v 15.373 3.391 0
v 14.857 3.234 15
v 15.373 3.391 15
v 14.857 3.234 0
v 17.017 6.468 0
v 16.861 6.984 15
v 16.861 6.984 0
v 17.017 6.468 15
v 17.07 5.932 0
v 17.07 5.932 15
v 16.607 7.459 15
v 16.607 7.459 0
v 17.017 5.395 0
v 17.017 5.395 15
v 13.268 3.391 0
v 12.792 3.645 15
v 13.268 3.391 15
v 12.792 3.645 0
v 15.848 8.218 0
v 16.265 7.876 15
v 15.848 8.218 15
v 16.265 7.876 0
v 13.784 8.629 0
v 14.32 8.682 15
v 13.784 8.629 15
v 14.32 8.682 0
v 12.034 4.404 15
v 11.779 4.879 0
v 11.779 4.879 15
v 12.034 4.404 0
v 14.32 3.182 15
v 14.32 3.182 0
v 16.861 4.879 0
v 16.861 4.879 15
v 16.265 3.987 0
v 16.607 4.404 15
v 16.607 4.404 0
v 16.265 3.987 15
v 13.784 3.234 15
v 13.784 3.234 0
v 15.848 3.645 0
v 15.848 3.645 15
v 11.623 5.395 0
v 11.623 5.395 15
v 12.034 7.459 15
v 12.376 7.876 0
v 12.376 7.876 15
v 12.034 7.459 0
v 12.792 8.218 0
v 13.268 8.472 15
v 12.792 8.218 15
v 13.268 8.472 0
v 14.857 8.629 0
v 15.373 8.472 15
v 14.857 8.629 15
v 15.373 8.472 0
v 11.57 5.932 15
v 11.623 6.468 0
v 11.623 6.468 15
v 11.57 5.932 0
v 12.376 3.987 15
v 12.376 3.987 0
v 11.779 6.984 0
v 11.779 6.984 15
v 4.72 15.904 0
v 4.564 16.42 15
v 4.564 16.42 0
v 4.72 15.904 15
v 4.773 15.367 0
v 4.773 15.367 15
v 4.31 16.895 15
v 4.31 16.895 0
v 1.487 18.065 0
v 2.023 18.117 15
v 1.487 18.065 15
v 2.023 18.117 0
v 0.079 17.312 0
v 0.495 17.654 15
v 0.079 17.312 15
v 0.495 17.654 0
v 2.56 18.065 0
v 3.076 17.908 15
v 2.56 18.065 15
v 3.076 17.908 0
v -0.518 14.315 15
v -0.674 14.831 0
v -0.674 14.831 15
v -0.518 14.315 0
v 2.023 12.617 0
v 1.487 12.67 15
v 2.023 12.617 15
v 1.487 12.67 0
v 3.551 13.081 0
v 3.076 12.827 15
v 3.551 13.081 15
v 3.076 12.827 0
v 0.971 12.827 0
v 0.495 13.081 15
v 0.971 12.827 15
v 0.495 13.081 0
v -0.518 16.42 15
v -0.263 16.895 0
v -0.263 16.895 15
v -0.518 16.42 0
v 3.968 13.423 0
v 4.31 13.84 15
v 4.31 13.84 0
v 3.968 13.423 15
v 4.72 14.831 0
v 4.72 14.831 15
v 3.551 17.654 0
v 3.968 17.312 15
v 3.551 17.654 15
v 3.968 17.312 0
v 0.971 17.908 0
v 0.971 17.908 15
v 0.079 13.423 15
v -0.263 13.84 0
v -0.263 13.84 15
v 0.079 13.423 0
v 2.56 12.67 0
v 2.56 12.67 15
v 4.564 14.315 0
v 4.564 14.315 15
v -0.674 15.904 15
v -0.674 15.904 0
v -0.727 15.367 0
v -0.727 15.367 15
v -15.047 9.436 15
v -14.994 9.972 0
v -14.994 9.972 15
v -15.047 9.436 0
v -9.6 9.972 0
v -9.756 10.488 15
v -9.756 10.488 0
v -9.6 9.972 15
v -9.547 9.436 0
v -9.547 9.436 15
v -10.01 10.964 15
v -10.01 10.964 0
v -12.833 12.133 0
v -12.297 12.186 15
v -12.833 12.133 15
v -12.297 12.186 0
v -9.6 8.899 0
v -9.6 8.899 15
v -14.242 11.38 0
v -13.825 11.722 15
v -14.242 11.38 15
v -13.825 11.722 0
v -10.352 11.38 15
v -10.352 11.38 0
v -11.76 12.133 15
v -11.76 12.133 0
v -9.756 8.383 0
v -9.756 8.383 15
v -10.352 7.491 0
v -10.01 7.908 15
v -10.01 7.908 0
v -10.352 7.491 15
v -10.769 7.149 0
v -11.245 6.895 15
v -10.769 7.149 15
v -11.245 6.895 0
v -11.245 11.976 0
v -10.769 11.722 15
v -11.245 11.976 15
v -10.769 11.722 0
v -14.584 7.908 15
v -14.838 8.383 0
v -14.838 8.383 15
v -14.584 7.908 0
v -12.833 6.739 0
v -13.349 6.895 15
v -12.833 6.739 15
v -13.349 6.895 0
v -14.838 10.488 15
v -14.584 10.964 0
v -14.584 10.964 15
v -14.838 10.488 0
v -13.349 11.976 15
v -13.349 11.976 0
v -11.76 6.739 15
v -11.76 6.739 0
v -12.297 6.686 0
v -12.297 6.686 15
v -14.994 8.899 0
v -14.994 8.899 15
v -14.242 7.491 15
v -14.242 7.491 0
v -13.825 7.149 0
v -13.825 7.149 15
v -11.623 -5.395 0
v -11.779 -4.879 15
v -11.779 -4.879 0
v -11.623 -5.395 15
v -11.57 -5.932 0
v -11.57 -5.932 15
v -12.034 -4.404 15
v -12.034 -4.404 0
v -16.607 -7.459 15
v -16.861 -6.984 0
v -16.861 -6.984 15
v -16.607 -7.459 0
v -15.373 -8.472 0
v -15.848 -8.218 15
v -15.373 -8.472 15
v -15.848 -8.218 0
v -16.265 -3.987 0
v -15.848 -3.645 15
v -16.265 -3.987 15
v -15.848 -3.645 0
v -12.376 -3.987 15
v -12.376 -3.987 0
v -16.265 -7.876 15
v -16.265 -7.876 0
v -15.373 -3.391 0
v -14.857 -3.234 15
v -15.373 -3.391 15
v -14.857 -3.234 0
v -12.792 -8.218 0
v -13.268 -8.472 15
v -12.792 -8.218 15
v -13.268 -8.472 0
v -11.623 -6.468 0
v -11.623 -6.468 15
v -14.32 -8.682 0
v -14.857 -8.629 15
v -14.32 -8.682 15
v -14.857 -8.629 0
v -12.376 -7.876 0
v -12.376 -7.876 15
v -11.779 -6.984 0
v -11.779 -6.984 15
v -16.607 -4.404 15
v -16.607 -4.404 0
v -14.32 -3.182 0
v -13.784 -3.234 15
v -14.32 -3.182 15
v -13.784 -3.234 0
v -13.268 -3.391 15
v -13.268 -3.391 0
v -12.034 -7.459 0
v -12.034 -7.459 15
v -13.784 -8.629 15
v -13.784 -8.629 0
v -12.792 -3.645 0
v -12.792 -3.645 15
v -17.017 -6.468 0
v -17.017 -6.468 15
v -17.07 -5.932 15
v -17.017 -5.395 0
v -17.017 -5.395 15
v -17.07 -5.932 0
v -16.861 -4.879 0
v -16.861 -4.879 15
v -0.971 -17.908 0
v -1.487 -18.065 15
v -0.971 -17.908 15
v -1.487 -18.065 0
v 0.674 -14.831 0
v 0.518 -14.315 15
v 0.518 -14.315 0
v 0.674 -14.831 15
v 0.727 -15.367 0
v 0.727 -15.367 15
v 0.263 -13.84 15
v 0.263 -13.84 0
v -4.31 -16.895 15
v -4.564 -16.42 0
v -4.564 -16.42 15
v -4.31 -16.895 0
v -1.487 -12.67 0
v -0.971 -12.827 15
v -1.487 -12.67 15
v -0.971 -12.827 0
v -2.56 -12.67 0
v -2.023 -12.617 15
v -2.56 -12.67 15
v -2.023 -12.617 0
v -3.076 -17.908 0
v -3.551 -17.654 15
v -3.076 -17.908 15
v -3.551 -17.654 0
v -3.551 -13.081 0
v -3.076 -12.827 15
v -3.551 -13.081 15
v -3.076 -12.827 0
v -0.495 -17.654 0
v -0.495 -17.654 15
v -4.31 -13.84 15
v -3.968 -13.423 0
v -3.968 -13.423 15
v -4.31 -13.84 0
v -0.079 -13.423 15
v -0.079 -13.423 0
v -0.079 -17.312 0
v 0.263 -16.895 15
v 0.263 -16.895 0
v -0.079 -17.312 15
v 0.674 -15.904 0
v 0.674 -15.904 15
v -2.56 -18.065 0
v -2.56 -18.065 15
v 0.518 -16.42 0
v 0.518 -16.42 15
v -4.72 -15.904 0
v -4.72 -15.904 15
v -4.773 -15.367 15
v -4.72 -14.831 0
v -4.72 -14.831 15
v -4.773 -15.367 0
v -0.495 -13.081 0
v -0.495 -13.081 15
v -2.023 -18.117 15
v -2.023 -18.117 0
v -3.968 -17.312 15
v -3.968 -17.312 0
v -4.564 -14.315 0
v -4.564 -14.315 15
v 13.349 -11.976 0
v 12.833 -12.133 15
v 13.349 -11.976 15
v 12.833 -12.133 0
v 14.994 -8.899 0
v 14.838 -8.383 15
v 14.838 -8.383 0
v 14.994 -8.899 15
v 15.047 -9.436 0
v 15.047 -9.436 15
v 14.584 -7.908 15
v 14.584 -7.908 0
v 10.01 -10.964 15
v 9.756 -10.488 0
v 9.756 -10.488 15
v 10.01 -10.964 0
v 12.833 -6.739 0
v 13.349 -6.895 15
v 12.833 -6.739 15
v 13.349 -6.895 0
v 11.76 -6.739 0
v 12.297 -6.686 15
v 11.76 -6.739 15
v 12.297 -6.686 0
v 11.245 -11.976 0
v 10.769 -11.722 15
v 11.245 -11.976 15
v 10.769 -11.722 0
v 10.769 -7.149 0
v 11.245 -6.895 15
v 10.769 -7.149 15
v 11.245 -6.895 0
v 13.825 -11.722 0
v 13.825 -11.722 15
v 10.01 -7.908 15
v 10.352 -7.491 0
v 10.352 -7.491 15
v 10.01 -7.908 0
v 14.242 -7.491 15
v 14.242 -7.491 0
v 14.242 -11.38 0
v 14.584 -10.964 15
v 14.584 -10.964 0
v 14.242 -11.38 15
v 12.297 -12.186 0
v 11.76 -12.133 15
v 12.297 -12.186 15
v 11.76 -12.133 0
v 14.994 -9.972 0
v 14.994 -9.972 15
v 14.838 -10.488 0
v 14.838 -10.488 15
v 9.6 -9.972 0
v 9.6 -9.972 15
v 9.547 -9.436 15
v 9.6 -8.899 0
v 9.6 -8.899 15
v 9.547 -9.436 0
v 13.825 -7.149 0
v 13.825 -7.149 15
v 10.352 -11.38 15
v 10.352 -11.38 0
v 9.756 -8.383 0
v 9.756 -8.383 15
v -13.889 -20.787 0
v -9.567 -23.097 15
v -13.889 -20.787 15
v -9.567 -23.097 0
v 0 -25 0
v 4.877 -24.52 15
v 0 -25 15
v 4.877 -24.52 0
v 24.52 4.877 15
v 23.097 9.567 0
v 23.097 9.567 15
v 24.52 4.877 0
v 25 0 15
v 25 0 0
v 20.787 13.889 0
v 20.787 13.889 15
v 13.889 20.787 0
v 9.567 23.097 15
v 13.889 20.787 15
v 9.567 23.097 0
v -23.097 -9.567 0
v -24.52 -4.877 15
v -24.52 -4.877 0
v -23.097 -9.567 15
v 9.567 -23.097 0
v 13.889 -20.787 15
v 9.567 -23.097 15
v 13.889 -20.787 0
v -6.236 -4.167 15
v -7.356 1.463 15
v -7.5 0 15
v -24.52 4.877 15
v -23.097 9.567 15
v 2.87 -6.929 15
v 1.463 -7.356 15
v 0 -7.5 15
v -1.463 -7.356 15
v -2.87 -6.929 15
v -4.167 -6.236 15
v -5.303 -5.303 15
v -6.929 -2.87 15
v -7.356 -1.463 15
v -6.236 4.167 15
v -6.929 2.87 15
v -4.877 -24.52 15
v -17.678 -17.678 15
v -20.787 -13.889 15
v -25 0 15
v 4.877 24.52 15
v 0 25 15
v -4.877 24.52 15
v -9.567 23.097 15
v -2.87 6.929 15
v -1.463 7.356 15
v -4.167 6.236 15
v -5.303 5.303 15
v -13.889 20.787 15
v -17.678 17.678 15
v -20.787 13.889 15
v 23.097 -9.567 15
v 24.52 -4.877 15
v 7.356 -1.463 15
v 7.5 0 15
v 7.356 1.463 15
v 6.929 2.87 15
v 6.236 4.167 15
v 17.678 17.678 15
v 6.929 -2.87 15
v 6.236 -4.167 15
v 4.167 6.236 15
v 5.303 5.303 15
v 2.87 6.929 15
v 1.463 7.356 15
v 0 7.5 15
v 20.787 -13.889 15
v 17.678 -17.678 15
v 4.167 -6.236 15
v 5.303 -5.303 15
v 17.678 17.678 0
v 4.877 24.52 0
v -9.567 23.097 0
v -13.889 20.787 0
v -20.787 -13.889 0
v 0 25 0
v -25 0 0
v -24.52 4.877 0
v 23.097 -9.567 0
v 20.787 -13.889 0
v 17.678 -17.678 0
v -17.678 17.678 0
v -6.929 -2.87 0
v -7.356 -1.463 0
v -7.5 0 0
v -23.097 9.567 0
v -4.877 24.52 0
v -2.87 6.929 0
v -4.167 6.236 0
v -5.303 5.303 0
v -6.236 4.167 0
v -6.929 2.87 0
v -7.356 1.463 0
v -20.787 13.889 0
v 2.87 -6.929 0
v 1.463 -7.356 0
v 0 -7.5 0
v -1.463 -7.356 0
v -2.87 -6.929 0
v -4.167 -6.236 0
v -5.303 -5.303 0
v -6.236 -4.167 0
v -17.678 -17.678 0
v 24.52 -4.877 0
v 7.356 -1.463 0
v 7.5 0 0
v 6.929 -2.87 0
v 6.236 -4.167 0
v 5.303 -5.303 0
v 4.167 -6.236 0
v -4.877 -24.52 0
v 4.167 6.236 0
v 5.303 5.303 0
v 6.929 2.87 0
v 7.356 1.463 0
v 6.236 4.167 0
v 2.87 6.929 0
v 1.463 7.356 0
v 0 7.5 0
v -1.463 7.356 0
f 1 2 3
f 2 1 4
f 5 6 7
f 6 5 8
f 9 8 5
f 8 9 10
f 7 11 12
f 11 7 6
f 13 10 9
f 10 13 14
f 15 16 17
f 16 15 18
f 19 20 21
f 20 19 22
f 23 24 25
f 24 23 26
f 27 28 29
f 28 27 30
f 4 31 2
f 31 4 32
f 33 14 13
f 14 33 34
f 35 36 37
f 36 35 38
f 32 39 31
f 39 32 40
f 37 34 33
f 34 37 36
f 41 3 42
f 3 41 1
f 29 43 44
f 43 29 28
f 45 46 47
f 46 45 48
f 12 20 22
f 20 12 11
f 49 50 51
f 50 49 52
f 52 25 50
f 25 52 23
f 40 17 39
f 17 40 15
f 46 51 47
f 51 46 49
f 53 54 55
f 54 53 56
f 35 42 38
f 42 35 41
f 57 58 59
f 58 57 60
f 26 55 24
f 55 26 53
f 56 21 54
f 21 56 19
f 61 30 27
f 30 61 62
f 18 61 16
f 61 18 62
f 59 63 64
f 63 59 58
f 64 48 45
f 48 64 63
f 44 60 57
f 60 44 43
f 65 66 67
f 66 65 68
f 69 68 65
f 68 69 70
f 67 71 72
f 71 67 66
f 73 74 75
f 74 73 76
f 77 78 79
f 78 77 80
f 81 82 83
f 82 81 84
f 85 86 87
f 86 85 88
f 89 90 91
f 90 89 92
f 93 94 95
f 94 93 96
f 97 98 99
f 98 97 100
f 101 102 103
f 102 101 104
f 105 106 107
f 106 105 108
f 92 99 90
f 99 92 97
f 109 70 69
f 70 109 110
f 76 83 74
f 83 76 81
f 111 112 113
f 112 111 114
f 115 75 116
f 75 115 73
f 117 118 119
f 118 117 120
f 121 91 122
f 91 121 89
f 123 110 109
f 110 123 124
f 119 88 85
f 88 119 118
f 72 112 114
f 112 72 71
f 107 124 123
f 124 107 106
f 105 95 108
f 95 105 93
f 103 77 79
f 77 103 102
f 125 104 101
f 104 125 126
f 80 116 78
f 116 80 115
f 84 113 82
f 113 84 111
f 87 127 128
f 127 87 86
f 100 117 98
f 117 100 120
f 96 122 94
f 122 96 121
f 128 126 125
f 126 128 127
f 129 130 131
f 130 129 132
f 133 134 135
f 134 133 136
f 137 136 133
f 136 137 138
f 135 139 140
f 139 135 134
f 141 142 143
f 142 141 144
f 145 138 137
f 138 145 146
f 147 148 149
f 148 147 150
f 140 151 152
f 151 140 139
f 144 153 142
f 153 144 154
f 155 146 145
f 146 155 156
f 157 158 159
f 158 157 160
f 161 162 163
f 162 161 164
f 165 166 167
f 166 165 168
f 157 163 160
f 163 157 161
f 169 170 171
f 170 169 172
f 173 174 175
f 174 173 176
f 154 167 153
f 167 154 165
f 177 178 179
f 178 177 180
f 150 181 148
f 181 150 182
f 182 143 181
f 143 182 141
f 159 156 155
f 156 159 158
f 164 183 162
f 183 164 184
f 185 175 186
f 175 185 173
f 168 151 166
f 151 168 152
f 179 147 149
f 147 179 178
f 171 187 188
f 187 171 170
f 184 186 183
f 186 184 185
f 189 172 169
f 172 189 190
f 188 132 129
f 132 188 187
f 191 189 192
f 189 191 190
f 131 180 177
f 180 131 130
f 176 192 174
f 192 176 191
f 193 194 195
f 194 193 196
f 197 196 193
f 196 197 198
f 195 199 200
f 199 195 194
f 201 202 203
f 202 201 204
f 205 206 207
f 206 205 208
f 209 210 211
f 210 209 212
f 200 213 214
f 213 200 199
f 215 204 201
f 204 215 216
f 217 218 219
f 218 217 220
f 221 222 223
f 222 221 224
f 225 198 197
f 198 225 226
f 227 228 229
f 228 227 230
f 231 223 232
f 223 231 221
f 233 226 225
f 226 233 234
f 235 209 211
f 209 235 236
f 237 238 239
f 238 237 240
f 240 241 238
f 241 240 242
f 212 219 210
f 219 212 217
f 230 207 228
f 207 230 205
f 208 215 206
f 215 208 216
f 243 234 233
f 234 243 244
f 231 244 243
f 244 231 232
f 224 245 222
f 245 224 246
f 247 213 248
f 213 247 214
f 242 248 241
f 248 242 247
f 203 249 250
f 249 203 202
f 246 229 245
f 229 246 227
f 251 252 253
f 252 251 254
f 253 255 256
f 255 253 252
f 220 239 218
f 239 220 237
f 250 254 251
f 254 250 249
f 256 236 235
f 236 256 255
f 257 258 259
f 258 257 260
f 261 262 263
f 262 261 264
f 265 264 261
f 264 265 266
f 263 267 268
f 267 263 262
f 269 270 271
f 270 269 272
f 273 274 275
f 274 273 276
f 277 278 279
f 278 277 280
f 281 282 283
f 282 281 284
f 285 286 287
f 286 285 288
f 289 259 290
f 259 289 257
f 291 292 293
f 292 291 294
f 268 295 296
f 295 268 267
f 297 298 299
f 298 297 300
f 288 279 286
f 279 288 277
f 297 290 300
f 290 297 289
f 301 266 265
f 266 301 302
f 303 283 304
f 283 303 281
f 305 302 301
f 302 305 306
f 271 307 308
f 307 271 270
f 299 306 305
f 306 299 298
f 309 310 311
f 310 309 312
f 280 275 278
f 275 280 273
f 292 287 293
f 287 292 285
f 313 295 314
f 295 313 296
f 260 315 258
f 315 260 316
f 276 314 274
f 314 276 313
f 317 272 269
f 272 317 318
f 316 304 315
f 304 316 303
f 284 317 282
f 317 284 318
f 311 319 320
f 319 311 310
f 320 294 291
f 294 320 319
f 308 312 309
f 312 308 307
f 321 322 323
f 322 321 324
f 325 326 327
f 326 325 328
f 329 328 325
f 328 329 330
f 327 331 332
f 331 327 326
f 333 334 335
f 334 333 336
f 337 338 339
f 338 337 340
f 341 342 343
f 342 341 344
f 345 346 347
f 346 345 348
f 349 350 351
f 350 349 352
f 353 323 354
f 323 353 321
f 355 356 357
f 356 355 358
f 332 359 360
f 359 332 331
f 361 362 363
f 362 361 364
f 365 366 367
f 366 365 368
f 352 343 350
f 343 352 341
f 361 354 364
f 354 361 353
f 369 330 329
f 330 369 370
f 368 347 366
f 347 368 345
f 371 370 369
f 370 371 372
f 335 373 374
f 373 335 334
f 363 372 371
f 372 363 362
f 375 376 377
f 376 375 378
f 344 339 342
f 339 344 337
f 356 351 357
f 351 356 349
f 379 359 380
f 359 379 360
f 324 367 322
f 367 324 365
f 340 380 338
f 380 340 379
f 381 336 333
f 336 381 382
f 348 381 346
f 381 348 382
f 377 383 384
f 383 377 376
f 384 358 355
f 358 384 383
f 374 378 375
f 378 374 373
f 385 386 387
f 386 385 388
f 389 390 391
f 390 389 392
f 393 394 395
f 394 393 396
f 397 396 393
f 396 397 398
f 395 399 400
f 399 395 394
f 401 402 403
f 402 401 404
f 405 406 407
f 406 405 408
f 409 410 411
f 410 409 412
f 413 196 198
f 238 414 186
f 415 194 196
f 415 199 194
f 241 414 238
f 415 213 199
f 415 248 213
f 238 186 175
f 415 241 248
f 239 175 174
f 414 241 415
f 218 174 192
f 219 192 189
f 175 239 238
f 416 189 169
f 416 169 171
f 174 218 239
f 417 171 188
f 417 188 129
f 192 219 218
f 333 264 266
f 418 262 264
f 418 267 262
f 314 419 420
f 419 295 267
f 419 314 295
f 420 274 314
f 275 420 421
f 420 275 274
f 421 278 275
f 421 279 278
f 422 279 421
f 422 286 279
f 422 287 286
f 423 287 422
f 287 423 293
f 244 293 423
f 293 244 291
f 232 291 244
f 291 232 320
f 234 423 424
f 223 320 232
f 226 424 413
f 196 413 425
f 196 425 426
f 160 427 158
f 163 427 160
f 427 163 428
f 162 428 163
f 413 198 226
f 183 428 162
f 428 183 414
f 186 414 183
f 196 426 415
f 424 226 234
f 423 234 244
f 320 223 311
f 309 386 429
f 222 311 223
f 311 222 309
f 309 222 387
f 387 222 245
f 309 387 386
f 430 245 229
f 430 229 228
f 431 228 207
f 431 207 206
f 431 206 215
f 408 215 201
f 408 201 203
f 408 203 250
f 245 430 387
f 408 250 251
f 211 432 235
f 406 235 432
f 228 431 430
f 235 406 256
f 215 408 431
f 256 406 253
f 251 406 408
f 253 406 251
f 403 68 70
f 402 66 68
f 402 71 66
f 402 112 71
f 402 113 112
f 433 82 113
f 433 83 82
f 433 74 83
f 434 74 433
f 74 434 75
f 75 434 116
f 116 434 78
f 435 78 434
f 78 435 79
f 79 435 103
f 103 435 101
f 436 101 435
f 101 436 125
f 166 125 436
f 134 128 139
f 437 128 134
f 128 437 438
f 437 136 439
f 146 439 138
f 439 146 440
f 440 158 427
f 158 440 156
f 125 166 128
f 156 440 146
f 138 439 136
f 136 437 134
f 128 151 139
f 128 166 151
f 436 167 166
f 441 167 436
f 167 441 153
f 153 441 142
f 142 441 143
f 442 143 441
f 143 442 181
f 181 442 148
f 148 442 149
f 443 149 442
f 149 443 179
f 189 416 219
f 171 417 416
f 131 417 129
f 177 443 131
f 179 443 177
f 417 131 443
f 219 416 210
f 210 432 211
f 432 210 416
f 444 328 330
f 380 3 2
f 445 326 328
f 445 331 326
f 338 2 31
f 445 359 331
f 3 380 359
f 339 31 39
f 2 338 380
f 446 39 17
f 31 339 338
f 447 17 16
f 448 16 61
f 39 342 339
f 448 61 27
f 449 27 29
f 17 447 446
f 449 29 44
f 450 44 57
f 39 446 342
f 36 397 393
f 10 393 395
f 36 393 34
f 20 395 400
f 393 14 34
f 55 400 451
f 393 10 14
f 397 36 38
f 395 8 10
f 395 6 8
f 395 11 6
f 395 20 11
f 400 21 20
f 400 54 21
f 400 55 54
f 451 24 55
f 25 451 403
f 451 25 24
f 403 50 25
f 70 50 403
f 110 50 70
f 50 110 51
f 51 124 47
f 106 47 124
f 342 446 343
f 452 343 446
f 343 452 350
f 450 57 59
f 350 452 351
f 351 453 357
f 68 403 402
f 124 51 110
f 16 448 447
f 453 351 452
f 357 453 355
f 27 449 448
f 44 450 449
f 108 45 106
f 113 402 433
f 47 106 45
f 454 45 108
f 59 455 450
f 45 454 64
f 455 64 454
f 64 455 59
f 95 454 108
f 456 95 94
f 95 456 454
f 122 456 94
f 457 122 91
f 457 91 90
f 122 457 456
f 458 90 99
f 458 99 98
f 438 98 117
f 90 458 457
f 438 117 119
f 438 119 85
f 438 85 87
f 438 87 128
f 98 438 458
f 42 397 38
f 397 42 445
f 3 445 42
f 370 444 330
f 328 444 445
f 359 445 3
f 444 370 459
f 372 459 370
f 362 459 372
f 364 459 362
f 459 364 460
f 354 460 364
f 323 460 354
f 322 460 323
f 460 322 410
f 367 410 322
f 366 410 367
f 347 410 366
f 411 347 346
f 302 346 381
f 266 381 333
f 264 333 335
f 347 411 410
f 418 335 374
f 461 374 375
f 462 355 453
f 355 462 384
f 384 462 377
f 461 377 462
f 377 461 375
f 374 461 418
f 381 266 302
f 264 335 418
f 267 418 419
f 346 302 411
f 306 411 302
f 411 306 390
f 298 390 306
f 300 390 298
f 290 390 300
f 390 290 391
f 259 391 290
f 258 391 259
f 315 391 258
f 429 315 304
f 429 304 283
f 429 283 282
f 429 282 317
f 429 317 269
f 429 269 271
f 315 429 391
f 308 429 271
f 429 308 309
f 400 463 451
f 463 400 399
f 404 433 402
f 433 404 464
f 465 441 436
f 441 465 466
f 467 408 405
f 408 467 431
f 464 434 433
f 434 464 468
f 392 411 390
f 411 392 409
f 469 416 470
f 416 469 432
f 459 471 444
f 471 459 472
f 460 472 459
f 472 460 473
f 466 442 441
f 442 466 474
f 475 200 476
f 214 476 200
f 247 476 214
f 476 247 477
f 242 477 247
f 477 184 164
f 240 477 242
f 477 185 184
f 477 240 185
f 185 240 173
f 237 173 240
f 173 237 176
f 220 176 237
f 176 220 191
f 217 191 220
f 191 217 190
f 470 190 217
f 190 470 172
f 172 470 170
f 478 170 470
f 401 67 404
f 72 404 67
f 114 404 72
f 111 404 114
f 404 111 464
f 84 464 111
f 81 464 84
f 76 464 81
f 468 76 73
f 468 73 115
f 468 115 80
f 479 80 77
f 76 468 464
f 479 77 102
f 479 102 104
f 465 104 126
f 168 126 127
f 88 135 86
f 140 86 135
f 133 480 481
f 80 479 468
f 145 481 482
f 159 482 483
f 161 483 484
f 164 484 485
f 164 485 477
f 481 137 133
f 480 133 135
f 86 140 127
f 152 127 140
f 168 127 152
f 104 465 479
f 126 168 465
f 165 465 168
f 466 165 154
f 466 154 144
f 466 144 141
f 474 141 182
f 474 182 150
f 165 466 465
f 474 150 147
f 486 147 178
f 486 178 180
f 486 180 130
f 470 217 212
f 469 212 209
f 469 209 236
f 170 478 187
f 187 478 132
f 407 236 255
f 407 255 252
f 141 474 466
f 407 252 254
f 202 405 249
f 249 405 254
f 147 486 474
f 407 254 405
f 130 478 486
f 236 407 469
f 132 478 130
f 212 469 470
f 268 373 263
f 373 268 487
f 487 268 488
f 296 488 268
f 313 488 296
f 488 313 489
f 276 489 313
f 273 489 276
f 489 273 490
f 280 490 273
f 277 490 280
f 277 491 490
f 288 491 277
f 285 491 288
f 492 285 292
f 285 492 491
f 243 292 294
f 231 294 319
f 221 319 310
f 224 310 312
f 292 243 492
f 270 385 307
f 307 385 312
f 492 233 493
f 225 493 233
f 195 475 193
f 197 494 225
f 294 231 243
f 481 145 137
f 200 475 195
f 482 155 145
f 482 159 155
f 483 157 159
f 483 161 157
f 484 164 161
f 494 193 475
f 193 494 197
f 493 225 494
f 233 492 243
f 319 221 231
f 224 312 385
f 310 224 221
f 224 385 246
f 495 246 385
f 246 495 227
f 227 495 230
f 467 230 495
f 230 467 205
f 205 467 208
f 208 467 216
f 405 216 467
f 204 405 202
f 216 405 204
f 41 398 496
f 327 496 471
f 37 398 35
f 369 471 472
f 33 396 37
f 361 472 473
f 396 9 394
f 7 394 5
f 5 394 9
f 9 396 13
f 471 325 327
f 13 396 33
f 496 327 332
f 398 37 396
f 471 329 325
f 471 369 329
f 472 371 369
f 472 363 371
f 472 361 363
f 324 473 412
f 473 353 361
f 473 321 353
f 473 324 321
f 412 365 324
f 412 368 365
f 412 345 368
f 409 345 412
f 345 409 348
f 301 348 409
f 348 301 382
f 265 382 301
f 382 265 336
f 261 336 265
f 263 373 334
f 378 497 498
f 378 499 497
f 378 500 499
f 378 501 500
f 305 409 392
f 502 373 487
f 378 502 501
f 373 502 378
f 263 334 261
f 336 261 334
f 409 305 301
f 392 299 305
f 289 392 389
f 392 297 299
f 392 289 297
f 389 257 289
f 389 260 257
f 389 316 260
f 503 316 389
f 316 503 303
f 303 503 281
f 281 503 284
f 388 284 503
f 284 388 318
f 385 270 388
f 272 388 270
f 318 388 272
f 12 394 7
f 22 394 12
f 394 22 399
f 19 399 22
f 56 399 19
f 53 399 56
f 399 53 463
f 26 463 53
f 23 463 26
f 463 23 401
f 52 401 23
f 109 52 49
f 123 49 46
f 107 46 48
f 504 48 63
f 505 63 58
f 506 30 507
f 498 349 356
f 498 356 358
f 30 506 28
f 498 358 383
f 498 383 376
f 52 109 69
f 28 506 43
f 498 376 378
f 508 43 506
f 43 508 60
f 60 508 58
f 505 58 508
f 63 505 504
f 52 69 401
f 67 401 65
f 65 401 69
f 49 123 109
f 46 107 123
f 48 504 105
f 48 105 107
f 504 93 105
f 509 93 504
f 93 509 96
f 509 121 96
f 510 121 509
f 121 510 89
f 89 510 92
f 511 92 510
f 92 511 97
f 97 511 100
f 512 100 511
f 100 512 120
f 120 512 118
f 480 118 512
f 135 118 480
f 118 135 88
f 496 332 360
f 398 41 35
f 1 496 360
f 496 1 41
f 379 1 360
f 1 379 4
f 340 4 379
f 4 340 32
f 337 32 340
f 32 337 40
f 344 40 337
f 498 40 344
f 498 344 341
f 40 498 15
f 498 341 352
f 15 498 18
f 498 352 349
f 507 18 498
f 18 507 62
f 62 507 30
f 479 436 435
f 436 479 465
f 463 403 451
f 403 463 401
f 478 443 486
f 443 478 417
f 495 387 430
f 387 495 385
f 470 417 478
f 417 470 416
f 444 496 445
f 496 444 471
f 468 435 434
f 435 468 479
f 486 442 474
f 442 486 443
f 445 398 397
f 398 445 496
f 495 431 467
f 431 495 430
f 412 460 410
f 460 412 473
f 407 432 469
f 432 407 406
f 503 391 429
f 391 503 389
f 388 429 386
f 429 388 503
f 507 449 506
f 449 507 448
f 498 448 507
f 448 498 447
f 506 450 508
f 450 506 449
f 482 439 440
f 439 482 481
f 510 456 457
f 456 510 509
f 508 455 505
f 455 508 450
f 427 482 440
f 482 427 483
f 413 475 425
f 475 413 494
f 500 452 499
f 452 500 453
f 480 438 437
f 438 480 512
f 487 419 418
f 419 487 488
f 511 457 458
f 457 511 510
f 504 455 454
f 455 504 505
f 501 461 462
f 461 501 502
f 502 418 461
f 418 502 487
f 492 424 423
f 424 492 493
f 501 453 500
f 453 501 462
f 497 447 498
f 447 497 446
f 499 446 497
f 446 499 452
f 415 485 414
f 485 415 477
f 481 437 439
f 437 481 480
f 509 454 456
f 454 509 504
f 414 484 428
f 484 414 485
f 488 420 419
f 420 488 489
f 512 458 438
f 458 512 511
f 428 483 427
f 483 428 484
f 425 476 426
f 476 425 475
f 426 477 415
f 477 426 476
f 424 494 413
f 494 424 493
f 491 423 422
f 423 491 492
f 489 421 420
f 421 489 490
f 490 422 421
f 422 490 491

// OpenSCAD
$fn = 32;

// ----------------------------------------------------------------------
// Flange Ø50 x 15
// 6 holes on a Ø31 bolt circle, bolted joints
// ----------------------------------------------------------------------

// --- parameters (mm) ---
flange_d = 50;     // outside diameter of the flange
thickness = 15;    // flange thickness
holes = 6;         // number of bolt holes
pcd = 31;          // bolt circle diameter
start_deg = 22.5;  // angle of the first hole, from +X
hole_d = 5.5;      // bolt hole diameter
bore_d = 15;       // central through bore
hub_d = 23;        // hub outside diameter
hub_h = 0;         // hub height above the flange face (0 = no hub)

// --- derived feature positions (mm) ---
height = thickness + hub_h;  // = 15   overall height of the part
pcd_r = pcd / 2;             // = 15.5   bolt circle radius
hole_step = 360 / holes;     // = 60   angular pitch
feature_centers = [
  [pcd_r * cos(start_deg + 0 * hole_step), pcd_r * sin(start_deg + 0 * hole_step)],
  [pcd_r * cos(start_deg + 1 * hole_step), pcd_r * sin(start_deg + 1 * hole_step)],
  [pcd_r * cos(start_deg + 2 * hole_step), pcd_r * sin(start_deg + 2 * hole_step)],
  [pcd_r * cos(start_deg + 3 * hole_step), pcd_r * sin(start_deg + 3 * hole_step)],
  [pcd_r * cos(start_deg + 4 * hole_step), pcd_r * sin(start_deg + 4 * hole_step)],
  [pcd_r * cos(start_deg + 5 * hole_step), pcd_r * sin(start_deg + 5 * hole_step)]
];   // bolt hole centres on the pitch circle

// flange disc, every hole and the bore cut straight through
difference() {
  union() {
    cylinder(d = flange_d, h = thickness);
  }
  translate([0, 0, -1]) cylinder(d = bore_d, h = height + 2);  // bore, through
  for (centre = feature_centers)
    translate([centre[0], centre[1], -1]) cylinder(d = hole_d, h = thickness + 2);
}
